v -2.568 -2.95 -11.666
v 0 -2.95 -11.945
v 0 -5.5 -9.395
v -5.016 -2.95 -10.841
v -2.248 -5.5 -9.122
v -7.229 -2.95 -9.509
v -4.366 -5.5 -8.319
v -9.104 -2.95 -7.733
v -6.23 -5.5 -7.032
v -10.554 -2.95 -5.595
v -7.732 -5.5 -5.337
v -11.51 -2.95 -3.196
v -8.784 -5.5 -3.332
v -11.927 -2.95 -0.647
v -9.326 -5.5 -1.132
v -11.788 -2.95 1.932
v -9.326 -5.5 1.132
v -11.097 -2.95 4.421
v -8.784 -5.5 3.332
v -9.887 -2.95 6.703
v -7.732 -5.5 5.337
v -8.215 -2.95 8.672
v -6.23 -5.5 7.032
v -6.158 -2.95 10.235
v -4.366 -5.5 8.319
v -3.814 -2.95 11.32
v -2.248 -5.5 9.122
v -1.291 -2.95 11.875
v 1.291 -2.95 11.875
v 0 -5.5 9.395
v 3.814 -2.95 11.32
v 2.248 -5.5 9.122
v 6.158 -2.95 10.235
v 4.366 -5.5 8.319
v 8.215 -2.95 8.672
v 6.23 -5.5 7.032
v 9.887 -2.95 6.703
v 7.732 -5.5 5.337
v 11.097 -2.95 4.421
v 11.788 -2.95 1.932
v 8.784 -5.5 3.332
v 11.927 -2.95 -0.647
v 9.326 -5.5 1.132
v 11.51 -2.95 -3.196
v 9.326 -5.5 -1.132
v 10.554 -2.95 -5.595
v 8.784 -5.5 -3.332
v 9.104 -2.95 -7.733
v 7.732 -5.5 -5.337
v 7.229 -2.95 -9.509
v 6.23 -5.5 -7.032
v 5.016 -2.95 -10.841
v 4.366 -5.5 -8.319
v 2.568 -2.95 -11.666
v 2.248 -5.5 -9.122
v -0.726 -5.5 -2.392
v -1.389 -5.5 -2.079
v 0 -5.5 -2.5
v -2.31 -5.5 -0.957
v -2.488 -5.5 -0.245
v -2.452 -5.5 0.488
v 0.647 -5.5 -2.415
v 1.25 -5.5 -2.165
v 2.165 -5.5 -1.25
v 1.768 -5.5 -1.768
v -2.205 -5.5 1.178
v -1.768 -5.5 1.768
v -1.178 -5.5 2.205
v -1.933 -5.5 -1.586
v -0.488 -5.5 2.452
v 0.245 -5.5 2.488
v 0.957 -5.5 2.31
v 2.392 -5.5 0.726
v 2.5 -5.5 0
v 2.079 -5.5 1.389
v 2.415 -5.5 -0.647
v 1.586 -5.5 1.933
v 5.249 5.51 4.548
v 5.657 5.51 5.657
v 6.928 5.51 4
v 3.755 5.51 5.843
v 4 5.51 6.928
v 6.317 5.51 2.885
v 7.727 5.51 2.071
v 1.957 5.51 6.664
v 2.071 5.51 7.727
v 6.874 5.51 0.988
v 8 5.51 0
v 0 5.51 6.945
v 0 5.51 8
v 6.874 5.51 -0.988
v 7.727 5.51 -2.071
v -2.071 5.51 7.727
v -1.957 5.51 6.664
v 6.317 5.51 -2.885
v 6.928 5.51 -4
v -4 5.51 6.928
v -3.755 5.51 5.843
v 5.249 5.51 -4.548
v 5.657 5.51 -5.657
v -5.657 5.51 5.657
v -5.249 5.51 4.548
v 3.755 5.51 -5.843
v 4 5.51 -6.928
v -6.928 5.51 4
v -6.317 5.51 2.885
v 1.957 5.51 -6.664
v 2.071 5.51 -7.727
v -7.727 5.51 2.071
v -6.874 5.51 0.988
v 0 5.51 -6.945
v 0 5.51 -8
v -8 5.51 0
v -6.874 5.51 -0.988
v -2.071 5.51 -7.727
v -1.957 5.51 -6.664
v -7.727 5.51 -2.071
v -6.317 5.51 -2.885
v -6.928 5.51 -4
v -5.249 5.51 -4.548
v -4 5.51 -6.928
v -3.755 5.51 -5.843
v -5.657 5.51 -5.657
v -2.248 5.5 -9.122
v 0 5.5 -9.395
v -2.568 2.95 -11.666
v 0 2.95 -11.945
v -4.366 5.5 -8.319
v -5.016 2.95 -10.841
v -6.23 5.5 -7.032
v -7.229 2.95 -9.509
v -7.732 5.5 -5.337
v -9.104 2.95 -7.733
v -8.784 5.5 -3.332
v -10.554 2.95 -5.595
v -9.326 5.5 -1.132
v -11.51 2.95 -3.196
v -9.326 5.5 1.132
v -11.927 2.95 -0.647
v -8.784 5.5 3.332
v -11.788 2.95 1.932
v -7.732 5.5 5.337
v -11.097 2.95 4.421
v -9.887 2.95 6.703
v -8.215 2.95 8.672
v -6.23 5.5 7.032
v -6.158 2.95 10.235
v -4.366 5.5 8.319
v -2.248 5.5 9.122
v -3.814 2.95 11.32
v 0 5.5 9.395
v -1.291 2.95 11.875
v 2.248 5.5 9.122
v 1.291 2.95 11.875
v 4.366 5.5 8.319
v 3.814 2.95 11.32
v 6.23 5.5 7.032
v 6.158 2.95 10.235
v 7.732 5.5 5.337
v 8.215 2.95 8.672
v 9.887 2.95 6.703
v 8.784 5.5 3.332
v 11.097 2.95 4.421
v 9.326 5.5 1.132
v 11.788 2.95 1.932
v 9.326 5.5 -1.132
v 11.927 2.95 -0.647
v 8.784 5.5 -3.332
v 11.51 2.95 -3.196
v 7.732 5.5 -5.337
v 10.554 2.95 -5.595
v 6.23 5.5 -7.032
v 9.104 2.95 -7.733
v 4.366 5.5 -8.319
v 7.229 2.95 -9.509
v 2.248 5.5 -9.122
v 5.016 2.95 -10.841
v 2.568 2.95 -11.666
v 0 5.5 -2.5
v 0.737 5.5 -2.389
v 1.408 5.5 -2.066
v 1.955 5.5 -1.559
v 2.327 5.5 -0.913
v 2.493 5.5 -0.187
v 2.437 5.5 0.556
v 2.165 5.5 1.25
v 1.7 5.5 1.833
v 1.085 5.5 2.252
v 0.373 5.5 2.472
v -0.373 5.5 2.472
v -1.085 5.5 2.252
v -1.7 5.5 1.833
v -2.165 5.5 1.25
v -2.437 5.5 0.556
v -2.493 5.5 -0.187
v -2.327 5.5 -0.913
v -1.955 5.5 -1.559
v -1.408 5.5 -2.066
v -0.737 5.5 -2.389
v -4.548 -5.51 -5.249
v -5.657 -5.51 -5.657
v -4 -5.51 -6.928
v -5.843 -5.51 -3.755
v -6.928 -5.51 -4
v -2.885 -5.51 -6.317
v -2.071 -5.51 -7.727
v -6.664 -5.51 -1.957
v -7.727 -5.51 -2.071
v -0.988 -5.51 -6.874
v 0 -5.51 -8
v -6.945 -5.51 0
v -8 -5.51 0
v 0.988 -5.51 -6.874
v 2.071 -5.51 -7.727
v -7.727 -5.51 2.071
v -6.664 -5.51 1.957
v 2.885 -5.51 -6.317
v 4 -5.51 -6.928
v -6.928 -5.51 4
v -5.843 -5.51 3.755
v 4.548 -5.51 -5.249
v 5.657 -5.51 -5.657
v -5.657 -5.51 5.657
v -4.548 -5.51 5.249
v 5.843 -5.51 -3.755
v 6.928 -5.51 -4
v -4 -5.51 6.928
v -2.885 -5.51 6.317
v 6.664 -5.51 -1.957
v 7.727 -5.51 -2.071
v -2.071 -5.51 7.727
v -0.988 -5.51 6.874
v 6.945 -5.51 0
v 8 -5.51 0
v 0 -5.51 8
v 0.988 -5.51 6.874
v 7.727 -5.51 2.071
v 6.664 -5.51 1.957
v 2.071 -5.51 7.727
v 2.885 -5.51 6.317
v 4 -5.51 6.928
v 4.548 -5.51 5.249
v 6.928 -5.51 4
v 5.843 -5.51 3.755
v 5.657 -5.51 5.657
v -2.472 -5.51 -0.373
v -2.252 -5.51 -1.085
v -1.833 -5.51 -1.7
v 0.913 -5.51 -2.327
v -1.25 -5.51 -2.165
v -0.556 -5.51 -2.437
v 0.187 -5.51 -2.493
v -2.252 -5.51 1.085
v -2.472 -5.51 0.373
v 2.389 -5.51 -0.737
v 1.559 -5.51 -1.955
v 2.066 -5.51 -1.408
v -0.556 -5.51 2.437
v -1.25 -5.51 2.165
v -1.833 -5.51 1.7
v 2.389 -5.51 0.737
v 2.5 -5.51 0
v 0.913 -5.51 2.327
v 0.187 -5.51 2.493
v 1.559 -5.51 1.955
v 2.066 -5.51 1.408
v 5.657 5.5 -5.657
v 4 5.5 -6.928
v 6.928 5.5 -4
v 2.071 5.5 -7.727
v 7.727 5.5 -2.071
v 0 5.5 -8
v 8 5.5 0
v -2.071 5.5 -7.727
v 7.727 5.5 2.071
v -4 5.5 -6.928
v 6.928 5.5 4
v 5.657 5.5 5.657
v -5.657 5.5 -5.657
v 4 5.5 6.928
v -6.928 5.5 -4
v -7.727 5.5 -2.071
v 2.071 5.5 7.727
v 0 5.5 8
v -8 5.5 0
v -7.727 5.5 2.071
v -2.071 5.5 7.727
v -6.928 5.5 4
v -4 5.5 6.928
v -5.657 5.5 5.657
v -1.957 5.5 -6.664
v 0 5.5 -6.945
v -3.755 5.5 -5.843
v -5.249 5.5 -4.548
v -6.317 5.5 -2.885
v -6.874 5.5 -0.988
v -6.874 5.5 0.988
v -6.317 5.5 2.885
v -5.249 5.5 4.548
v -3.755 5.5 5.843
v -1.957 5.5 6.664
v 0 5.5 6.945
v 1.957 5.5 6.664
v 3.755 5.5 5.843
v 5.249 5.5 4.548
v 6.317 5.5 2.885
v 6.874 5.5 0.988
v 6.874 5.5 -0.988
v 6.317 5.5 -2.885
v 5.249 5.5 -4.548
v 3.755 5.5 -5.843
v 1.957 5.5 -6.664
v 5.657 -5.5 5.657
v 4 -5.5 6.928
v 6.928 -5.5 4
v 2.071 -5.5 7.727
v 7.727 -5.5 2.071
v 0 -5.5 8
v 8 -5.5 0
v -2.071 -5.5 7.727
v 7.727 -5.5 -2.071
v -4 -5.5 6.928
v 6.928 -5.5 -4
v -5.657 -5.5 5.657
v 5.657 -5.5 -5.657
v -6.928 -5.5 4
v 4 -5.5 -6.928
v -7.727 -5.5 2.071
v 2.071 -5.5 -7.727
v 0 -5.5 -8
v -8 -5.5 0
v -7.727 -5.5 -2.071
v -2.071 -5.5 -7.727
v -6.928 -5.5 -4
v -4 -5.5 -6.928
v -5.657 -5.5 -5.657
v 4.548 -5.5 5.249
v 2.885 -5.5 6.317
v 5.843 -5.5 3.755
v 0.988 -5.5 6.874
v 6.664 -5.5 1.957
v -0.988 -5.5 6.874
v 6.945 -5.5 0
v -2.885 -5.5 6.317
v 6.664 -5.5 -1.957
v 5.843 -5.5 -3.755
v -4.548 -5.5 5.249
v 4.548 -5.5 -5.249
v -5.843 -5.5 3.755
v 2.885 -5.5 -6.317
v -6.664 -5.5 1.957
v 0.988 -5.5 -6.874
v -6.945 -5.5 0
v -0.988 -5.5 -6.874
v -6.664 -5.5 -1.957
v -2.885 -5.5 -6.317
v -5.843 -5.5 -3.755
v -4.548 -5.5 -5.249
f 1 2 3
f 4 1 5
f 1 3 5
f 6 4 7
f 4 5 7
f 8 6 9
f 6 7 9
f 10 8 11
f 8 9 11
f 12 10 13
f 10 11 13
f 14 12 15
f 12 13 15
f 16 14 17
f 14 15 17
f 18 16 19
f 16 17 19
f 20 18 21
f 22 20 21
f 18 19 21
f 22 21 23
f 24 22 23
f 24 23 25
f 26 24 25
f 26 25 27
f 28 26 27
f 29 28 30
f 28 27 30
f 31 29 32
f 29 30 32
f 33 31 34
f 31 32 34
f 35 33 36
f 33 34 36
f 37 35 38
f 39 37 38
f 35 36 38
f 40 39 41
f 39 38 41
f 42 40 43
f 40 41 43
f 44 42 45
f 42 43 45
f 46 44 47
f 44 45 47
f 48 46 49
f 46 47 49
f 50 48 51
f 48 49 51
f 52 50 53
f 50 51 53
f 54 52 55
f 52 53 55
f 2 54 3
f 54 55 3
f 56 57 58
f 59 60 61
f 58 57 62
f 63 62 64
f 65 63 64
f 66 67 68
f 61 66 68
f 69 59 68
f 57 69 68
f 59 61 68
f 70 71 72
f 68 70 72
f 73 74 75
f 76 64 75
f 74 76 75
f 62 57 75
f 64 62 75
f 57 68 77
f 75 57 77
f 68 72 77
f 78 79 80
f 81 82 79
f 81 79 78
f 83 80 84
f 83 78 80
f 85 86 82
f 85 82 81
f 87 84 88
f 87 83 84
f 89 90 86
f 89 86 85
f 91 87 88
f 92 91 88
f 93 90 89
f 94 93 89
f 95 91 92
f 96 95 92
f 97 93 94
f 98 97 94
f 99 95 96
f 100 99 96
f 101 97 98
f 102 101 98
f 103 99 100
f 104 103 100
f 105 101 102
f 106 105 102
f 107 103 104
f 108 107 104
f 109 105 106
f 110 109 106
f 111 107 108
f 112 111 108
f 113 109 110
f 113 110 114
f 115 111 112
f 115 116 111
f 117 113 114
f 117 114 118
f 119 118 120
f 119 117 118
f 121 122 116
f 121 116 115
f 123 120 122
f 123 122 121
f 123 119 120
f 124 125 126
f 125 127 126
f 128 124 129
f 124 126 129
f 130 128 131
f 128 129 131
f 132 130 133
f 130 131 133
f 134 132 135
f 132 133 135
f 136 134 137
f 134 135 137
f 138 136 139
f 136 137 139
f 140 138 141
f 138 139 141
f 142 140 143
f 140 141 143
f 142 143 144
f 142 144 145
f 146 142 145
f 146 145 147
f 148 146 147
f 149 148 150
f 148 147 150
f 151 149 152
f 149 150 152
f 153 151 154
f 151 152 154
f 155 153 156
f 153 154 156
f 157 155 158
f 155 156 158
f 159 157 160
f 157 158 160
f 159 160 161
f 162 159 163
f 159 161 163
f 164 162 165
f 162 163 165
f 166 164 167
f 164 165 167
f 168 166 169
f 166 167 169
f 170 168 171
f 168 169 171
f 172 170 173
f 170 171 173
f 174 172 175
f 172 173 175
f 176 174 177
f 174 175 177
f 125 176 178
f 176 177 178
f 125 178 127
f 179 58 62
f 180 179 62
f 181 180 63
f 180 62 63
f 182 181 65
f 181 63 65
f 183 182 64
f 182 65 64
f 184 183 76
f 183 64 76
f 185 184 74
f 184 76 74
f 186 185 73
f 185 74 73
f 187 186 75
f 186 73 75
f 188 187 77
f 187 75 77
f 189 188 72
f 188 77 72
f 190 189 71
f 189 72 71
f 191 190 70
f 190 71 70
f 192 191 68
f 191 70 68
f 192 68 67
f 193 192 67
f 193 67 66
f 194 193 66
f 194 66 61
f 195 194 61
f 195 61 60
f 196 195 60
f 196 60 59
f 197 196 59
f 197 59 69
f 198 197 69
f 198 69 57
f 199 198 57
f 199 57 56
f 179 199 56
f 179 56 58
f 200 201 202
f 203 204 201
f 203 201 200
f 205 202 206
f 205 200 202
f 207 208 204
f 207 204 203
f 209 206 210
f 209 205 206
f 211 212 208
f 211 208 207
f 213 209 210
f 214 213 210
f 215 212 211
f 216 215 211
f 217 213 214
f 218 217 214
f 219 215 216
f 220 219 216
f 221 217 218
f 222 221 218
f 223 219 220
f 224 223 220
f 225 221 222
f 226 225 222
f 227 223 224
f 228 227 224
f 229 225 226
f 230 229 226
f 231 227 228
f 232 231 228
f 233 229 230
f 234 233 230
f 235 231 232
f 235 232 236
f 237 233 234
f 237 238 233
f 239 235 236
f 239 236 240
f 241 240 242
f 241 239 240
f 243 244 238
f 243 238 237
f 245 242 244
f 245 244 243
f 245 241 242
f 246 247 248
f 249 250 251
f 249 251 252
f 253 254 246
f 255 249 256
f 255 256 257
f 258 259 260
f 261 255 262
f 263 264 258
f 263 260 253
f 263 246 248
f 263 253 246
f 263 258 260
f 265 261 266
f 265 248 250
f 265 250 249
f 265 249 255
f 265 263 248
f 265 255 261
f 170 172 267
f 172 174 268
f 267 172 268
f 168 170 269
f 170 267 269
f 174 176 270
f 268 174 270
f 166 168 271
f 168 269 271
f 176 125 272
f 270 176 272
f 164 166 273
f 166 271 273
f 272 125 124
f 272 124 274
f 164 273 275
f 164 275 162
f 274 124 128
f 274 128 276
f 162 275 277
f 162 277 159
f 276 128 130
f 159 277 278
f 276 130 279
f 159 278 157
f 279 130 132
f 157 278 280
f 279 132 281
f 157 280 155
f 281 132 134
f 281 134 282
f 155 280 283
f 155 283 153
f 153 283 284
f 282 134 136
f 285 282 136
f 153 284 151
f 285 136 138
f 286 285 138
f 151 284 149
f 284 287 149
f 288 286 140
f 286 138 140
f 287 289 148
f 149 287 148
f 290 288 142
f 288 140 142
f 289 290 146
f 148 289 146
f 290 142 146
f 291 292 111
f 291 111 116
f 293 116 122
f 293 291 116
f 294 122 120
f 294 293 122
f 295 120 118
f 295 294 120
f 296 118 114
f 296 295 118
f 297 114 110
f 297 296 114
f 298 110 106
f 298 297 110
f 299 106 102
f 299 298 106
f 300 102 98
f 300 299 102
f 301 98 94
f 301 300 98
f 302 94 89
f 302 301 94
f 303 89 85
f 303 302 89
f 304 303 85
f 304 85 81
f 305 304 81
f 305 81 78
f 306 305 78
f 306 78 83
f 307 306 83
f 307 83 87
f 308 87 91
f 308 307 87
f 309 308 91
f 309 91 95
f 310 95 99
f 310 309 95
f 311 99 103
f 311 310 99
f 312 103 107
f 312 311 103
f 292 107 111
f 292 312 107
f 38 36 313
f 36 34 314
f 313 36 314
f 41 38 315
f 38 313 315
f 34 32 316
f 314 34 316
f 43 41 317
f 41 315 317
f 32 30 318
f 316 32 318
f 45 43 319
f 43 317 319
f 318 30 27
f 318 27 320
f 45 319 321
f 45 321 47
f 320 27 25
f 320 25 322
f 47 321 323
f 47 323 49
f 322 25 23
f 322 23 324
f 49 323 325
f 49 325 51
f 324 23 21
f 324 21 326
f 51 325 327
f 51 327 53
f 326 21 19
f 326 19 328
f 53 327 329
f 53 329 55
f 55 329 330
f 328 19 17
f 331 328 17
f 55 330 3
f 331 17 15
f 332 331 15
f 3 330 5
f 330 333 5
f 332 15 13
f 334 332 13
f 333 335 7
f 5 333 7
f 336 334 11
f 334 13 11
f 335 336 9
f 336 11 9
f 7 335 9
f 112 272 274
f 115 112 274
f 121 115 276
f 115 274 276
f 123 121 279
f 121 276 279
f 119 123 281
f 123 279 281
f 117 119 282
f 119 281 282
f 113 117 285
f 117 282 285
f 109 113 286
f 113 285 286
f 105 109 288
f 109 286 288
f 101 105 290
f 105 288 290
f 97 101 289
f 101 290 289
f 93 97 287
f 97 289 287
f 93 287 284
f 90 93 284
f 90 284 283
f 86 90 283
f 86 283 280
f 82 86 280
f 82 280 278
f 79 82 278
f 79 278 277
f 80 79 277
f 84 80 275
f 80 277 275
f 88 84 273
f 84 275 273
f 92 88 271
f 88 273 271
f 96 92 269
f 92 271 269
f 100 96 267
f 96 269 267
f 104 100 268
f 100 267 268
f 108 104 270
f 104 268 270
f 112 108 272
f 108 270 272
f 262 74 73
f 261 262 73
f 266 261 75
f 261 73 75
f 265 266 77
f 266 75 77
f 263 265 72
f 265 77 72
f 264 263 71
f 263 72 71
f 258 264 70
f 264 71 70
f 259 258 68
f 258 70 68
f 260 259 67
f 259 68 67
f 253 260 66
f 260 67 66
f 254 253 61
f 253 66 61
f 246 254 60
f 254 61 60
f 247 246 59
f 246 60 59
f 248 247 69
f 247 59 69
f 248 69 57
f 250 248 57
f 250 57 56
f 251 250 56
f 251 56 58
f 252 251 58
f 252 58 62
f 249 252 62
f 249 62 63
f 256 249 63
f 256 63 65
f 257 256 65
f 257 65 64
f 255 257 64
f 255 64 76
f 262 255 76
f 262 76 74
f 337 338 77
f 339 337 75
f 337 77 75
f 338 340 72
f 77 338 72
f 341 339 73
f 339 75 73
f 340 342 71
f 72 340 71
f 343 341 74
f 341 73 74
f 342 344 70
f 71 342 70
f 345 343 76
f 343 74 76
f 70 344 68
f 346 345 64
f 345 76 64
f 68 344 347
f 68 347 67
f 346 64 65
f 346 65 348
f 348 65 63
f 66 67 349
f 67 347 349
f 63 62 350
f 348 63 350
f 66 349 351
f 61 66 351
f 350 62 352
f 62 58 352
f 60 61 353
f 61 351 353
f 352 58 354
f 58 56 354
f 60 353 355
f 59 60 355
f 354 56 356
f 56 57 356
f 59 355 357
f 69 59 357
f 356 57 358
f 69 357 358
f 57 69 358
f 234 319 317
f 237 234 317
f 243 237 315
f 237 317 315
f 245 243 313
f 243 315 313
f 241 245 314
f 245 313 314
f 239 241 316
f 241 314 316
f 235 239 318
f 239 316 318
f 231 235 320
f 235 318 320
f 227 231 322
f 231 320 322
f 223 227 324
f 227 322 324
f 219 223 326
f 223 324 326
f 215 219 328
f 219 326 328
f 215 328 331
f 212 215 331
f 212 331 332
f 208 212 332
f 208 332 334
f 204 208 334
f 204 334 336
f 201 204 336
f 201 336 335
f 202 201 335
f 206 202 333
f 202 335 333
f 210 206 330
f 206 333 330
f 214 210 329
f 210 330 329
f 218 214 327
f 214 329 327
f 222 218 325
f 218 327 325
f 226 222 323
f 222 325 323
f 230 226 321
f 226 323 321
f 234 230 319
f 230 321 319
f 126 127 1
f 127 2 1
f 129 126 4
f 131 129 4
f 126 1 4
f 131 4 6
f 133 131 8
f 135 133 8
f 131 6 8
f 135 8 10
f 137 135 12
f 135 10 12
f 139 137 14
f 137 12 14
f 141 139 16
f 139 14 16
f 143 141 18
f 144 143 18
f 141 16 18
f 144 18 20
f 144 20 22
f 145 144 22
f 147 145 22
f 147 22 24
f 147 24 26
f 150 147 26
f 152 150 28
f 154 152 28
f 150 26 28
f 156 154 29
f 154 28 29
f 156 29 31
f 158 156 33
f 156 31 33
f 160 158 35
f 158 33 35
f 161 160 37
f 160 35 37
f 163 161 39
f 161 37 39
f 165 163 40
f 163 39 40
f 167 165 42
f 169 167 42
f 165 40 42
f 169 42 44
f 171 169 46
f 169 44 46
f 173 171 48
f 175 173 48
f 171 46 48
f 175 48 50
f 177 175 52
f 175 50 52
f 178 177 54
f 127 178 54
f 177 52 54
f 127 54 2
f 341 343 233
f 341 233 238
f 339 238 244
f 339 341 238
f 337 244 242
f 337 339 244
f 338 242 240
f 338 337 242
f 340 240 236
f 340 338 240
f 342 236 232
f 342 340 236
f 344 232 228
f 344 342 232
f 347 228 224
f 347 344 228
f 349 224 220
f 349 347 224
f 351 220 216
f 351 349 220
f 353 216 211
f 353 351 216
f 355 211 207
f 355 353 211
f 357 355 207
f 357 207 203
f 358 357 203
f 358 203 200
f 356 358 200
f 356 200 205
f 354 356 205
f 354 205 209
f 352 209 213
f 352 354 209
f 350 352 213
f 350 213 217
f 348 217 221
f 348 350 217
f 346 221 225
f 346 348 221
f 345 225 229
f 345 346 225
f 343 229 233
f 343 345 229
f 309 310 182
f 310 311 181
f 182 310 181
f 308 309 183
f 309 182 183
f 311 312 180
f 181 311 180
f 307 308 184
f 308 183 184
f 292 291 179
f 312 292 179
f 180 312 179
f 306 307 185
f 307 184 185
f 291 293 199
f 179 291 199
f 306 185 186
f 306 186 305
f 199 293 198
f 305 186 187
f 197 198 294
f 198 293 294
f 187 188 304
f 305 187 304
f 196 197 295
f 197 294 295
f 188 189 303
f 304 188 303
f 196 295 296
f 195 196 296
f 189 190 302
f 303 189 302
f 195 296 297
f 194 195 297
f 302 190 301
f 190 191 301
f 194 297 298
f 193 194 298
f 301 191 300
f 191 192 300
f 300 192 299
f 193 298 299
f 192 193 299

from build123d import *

# Parameters (mm, degrees)
CUT_EXTRUDE1_REACH  = 22.159
SKETCH2_R           = 2.5
SKETCH4_R           = 8
SKETCH4_R_2         = 6.945
BOSS_EXTRUDE1_DEPTH = 0.01
BOSS_EXTRUDE2_START = 0.01
SKETCH3_R           = 8
SKETCH3_R_2         = 6.945
SKETCH3_R_3         = 2.5
BOSS_EXTRUDE2_DEPTH = 0.01


with BuildPart() as part:
    # Sketch1 → Revolve1 (revolve)
    with BuildSketch(Plane.XY):
        Polygon((0, 5.5), (9.395, 5.5), (11.945, 2.95), (11.945, -2.95), (9.395, -5.5), (0, -5.5), align=None)
    revolve(axis=Axis((0, 0, 0), (0, 1, 0)))

    # Sketch2 → Cut-Extrude1 (cut, up to next)
    with BuildSketch(Plane(origin=(0, -5.5, 0), x_dir=(-1, 0, 0), z_dir=(0, -1, 0)), mode=Mode.PRIVATE) as cut_extrude1_sk1:
        Circle(SKETCH2_R)
    cut_extrude1_tool1 = extrude(cut_extrude1_sk1.sketch, amount=-CUT_EXTRUDE1_REACH, mode=Mode.PRIVATE) & part.part
    add(cut_extrude1_tool1.solids().sort_by_distance((0, -5.5, 0))[0], mode=Mode.SUBTRACT)

    # Sketch4 → Boss-Extrude1 (add)
    with BuildSketch(Plane(origin=(0, 5.5, 0), x_dir=(1, 0, 0), z_dir=(0, 1, 0))):
        Circle(SKETCH4_R)
        Circle(SKETCH4_R_2, mode=Mode.SUBTRACT)
    extrude(amount=BOSS_EXTRUDE1_DEPTH)

    # Sketch3 → Boss-Extrude2 (add)
    # profile 1 of 2: a face of its own
    with BuildSketch(Plane.XZ.offset(5.5).offset(BOSS_EXTRUDE2_START)):
        Circle(SKETCH3_R)
        Circle(SKETCH3_R_2, mode=Mode.SUBTRACT)
    # profile 2 of 2: a face of its own
    with BuildSketch(Plane.XZ.offset(5.5).offset(BOSS_EXTRUDE2_START)):
        Circle(SKETCH3_R_3)
    extrude(amount=-BOSS_EXTRUDE2_DEPTH)


with BuildPart() as boss_extrude2_piece_1:
    # of the separate pieces the step leaves, piece 1, a body of its own (boss_extrude2_pieces)
    add(part.part.solids().sort_by_distance((9.395, 5.5, 0))[0])


with BuildPart() as boss_extrude2_piece_2:
    # of the separate pieces the step leaves, piece 2, a body of its own (boss_extrude2_pieces)
    add(part.part.solids().sort_by_distance((2.5, -5.51, 0))[0])


solid = Compound([boss_extrude2_piece_1.part, boss_extrude2_piece_2.part])
